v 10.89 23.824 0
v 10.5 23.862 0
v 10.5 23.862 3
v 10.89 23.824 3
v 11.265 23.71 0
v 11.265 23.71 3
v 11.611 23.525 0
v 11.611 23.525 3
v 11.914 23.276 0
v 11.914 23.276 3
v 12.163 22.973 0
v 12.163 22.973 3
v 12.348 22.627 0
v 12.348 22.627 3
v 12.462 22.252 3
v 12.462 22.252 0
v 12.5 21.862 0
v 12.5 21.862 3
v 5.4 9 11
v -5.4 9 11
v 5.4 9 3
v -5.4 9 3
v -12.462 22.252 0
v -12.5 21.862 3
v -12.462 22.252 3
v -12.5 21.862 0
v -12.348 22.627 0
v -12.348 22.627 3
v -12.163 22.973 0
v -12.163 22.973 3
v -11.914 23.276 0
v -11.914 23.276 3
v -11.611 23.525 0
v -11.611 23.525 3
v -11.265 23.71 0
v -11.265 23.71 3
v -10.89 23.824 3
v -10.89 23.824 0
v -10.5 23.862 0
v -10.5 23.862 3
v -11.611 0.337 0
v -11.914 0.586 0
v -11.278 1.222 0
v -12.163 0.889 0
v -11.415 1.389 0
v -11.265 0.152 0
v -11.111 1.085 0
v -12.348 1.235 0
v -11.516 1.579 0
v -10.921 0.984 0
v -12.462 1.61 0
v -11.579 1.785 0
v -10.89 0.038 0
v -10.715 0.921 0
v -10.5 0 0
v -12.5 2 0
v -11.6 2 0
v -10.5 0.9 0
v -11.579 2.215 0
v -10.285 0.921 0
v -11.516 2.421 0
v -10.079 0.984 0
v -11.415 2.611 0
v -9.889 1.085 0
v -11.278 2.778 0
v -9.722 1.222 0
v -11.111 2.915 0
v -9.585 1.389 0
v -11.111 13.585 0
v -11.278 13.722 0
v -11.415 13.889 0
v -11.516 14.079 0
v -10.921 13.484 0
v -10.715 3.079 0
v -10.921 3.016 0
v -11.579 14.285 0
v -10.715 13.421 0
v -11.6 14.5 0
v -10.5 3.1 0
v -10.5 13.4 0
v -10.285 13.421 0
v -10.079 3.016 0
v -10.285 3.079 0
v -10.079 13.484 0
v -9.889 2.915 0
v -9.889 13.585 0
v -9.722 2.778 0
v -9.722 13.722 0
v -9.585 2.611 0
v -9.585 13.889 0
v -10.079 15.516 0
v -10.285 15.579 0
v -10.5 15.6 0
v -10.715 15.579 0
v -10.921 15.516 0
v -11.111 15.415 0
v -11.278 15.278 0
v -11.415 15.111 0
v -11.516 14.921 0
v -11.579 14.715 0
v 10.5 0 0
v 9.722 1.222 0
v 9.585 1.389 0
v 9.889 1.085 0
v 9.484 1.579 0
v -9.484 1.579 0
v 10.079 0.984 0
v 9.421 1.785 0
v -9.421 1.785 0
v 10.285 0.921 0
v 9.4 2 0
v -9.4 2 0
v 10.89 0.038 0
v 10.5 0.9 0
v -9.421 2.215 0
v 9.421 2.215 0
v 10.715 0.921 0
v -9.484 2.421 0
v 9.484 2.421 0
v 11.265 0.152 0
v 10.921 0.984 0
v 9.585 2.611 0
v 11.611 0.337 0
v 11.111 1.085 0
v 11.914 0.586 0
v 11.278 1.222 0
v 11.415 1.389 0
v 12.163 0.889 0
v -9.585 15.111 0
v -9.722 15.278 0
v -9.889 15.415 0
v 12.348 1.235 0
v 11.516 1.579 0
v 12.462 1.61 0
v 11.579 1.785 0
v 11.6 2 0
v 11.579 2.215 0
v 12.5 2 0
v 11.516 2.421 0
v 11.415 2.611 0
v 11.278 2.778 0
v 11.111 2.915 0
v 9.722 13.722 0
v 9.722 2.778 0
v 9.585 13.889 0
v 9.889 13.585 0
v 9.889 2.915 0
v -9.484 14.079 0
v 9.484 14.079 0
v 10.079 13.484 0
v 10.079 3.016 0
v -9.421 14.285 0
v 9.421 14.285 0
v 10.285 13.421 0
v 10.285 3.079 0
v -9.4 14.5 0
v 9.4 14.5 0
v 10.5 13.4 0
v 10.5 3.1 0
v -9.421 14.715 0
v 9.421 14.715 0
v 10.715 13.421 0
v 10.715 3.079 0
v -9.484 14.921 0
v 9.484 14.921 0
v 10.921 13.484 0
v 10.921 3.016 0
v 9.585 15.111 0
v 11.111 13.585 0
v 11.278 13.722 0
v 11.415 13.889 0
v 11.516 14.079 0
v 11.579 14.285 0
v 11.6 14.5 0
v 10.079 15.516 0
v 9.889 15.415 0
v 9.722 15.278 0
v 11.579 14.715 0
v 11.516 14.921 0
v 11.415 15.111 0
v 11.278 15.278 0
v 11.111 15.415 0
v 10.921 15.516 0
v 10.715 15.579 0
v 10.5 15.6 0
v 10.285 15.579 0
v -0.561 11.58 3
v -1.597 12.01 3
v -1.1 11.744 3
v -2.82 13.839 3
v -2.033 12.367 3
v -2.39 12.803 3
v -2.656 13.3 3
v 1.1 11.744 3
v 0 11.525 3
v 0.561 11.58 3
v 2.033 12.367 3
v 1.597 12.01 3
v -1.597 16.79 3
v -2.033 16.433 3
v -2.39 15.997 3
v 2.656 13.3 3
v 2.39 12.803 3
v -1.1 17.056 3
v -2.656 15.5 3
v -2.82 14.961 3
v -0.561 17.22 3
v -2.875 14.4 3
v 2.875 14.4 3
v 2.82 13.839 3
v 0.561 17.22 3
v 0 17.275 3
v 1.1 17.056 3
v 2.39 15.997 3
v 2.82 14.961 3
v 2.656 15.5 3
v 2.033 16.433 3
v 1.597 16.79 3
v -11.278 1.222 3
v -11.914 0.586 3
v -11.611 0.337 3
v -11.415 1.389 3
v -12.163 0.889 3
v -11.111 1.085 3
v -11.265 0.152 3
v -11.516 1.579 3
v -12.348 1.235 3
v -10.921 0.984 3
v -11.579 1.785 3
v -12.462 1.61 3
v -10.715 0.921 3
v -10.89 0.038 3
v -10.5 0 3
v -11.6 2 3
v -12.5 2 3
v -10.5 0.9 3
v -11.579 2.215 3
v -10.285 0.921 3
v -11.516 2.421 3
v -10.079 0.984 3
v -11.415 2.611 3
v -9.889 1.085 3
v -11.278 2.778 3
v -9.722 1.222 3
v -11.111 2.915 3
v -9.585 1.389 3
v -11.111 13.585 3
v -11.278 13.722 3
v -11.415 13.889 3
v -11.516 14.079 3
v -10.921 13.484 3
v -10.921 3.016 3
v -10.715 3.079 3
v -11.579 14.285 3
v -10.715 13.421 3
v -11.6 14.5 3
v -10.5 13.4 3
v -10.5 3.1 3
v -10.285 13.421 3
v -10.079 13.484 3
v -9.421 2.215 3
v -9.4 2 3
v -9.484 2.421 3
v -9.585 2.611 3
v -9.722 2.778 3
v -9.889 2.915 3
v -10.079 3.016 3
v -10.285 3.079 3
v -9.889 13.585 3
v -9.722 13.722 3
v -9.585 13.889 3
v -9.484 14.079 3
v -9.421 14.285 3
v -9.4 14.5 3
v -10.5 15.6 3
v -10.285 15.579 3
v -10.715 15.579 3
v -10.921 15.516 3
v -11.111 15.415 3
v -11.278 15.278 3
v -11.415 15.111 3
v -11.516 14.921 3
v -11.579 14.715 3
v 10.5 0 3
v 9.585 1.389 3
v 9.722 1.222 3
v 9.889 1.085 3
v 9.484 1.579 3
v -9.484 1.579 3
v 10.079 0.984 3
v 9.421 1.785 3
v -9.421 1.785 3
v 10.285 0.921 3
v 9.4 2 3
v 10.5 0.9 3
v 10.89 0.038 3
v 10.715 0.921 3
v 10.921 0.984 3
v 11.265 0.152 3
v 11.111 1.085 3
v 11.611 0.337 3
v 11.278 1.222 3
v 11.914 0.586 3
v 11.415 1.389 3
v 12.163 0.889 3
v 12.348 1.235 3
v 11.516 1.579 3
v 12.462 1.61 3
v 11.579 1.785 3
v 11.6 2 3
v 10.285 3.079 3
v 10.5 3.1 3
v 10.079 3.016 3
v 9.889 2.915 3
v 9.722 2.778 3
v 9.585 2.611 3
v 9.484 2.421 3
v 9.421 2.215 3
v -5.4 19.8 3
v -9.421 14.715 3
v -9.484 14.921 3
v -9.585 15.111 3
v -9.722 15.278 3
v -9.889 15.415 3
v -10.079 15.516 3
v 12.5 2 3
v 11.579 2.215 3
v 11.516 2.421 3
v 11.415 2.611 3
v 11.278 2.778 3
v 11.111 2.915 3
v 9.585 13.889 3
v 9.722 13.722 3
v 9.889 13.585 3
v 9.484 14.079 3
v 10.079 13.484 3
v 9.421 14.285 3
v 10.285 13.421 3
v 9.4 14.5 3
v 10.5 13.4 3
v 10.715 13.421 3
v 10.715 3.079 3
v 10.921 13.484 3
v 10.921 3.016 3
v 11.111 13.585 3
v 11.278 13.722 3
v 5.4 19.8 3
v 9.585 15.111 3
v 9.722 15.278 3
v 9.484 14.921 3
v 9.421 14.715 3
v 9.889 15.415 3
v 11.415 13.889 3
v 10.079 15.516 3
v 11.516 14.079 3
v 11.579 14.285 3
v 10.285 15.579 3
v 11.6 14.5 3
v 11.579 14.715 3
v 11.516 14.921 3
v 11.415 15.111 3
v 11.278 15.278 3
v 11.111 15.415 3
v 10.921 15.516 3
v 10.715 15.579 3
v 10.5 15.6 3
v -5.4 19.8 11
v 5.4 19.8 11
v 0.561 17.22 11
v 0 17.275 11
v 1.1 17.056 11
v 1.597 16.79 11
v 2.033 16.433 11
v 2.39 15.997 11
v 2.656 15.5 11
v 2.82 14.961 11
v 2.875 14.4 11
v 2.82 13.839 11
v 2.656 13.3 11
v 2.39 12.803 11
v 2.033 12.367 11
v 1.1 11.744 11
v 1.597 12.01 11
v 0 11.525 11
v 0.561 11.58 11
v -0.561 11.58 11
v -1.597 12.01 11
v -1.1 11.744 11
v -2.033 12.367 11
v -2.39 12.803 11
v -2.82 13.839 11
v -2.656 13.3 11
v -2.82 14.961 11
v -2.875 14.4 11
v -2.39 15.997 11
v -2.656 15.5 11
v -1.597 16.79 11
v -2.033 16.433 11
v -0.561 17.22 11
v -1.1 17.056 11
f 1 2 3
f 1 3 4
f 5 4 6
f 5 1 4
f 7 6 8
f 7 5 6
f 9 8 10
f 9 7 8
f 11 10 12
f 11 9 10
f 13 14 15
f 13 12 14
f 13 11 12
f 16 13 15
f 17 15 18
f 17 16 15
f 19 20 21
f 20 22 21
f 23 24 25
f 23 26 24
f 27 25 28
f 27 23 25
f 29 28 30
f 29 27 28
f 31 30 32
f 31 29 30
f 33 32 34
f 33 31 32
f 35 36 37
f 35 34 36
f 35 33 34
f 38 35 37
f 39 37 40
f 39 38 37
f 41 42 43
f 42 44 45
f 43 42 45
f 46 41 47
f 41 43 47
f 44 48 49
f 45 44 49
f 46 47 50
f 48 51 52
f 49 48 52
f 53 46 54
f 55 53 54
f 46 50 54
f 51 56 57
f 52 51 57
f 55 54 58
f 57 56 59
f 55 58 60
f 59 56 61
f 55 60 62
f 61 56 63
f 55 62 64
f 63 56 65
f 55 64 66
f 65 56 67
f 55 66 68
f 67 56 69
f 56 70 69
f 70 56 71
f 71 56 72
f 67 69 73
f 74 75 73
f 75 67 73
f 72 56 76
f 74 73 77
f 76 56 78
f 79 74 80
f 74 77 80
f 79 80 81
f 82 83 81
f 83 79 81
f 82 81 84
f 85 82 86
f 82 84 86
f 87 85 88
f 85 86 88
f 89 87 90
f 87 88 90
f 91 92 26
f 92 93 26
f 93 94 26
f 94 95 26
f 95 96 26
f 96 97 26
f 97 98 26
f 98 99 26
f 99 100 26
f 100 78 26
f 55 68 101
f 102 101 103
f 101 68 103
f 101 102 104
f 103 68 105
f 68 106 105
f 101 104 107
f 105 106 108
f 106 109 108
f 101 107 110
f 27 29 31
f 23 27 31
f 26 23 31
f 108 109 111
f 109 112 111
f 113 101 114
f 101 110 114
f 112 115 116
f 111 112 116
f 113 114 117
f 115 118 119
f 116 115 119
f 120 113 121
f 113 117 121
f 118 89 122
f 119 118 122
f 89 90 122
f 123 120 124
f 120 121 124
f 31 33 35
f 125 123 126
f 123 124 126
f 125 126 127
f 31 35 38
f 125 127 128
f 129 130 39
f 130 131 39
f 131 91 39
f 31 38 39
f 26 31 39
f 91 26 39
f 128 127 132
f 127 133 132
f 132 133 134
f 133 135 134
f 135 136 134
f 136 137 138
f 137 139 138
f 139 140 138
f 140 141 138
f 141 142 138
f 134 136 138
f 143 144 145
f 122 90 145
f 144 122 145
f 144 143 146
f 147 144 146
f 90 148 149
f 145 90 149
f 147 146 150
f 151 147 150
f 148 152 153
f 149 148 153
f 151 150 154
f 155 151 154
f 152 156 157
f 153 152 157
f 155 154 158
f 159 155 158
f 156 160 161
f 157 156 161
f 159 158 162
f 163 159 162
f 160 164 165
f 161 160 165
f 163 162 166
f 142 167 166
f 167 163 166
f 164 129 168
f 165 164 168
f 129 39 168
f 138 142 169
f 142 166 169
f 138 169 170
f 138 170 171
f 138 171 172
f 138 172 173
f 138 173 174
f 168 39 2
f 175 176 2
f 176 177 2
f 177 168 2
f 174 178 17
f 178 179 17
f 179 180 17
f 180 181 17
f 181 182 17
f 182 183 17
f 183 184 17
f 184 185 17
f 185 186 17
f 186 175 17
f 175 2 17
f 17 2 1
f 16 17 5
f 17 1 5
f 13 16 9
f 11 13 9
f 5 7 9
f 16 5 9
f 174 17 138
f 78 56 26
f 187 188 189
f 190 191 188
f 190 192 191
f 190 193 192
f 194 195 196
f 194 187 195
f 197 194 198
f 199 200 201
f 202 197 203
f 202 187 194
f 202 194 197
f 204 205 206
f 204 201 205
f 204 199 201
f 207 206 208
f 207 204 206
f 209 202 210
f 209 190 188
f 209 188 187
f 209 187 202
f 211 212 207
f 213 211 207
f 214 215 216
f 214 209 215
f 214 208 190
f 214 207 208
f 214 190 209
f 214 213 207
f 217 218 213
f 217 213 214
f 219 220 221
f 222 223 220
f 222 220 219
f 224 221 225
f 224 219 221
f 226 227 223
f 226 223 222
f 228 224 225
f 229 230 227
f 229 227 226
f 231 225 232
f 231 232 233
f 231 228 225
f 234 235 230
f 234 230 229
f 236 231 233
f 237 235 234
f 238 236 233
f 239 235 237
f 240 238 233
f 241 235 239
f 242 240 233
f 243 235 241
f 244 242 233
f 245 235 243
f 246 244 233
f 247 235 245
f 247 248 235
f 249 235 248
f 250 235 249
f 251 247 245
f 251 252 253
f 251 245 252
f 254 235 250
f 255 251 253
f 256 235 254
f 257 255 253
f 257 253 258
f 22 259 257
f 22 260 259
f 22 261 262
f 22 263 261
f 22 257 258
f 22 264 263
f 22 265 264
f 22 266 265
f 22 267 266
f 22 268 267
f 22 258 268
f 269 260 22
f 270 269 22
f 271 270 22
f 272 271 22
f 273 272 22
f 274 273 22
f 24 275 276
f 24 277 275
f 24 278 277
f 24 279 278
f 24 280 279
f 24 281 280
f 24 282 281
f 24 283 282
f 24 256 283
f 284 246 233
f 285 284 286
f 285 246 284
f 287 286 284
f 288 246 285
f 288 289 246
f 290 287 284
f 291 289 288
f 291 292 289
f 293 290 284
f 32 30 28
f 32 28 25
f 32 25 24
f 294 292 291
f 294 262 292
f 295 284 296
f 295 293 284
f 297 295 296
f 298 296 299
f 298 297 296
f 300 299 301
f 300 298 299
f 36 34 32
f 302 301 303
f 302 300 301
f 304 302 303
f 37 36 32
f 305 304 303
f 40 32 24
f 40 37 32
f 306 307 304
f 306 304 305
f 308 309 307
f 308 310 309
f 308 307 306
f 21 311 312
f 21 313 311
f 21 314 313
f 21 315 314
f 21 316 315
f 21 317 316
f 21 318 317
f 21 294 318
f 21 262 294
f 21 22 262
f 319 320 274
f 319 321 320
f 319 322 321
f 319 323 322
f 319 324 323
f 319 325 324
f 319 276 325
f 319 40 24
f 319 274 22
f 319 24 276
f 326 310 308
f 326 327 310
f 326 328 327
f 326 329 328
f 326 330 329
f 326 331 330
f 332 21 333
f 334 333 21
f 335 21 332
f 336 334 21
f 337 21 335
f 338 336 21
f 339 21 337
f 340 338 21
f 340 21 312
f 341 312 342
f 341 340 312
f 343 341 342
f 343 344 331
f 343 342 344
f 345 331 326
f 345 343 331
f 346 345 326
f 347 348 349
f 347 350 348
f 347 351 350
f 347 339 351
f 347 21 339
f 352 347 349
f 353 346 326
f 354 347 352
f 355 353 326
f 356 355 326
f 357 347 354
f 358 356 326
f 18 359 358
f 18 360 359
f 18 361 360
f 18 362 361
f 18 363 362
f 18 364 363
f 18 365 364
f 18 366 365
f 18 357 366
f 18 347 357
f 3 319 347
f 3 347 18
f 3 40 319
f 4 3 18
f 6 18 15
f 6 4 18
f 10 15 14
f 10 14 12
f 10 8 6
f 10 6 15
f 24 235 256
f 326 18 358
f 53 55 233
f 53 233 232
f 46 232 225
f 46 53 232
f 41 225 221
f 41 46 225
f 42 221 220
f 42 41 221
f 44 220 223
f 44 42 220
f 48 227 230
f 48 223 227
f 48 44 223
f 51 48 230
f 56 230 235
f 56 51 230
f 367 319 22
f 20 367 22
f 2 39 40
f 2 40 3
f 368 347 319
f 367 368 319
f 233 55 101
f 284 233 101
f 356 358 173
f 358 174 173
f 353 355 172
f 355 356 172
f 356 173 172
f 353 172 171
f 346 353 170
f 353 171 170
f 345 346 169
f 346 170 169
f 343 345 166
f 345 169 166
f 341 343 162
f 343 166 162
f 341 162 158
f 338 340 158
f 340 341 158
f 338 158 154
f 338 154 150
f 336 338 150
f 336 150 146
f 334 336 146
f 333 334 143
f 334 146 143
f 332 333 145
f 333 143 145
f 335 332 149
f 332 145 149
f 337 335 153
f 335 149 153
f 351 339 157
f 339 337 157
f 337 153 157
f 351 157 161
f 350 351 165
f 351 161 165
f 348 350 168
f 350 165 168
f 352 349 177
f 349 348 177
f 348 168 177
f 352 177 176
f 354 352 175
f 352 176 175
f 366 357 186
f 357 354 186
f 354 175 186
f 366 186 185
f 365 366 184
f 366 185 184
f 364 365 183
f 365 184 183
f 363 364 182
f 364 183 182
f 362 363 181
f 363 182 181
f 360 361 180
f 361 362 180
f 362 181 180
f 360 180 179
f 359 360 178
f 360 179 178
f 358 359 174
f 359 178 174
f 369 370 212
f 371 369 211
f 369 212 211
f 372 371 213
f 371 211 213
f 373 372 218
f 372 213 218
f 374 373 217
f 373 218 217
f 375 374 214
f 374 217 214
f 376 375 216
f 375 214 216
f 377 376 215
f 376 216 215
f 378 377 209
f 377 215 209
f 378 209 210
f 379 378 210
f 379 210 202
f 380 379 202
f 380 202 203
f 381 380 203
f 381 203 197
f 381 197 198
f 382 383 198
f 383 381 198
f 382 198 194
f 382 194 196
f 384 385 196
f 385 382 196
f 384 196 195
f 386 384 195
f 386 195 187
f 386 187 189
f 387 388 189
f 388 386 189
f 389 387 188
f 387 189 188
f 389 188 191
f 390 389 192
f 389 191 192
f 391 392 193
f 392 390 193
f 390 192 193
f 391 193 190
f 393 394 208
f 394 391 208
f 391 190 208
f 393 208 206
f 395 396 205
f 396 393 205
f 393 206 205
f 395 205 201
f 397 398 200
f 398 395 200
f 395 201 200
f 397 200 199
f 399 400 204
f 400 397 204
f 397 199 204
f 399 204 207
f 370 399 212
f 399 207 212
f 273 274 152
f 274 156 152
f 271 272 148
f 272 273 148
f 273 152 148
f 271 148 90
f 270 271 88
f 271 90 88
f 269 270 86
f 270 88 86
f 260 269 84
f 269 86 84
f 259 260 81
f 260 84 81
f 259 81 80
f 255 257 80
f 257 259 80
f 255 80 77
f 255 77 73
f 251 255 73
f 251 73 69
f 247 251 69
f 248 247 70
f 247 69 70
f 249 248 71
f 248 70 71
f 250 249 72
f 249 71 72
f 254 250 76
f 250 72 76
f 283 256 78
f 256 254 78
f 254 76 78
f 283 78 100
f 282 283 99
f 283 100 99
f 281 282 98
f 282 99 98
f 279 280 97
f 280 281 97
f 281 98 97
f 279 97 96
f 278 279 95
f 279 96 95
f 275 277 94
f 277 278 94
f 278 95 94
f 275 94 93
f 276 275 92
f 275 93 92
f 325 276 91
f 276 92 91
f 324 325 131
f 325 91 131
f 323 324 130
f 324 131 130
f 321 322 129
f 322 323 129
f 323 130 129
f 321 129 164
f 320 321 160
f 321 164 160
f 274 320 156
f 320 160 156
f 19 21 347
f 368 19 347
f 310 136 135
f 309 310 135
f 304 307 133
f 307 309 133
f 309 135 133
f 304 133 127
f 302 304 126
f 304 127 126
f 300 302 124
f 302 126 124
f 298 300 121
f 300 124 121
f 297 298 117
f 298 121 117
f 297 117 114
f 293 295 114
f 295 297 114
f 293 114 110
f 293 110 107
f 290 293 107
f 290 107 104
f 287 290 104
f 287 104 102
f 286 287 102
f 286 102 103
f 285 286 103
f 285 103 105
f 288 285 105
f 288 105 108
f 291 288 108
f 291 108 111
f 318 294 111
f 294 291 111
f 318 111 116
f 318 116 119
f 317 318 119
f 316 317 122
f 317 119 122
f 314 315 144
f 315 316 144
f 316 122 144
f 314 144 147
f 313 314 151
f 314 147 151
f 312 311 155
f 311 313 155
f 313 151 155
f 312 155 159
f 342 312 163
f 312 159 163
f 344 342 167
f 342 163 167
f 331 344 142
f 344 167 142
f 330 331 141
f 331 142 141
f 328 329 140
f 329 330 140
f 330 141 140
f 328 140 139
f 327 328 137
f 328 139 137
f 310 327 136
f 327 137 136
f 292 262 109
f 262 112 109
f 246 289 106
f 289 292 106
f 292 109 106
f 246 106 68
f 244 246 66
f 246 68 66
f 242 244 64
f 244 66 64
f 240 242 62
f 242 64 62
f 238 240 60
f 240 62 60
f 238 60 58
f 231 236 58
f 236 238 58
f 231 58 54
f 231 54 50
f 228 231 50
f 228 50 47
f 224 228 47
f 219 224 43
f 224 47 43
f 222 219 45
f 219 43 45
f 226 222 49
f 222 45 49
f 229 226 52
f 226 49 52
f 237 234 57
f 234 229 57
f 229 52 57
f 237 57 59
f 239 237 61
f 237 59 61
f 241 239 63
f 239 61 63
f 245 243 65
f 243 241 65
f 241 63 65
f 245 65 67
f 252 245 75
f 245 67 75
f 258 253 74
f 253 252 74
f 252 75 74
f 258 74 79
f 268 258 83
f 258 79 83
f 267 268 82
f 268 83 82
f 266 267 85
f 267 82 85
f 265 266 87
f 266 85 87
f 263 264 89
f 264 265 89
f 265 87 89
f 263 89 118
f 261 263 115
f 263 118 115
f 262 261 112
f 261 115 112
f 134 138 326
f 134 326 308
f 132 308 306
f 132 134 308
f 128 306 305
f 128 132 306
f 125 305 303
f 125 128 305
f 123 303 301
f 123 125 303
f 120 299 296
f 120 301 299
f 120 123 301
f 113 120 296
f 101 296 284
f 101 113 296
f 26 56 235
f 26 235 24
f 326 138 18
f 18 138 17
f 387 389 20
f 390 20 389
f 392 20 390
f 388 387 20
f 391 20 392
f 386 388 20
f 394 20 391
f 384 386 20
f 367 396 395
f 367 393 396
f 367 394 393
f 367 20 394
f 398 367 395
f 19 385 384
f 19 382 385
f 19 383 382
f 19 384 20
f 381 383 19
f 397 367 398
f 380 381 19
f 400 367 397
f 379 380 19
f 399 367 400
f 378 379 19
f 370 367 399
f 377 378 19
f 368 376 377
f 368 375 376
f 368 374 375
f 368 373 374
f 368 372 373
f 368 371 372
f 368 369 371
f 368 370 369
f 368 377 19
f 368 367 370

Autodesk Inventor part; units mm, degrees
ref_plane "YZ Plane" through (0, 0, 0) normal (1, 0, 0) x (0, 1, 0)
ref_plane "XZ Plane" through (0, 0, 0) normal (0, 1, 0) x (-1, 0, 0)
ref_plane "XY Plane" through (0, 0, 0) normal (0, 0, 1) x (1, 0, 0)
sketch "Náčrt1" plane through (0, 0, 0) normal (0, 0, 1) x (1, 0, 0)
  line L0 (12.5, 2) -> (12.5, 21.862)
  line L1 (10.5, 23.862) -> (0, 23.862)
  circle A0 centre (10.5, 2) radius 1.1
  arc A1 (12.5, 3.2809) -> (9.2191, 0) centre (10.5, 2) ccw
  circle A2 centre (10.5, 14.5) radius 1.1
  arc A3 (12.5, 15.7809) -> (12.5, 13.2191) centre (10.5, 14.5) ccw
  line L2 (0, 0) -> (10.5, 0)
  arc A4 (10.5, 0) -> (12.5, 2) centre (10.5, 2) ccw
  arc A5 (12.5, 21.862) -> (10.5, 23.862) centre (10.5, 21.862) ccw
  line L3 (-12.5, 2) -> (-12.5, 21.862)
  line L4 (-10.5, 23.862) -> (0, 23.862)
  circle A6 centre (-10.5, 2) radius 1.1
  arc A7 (-9.2191, 0) -> (-12.5, 3.2809) centre (-10.5, 2) ccw
  circle A8 centre (-10.5, 14.5) radius 1.1
  arc A9 (-12.5, 13.2191) -> (-12.5, 15.7809) centre (-10.5, 14.5) ccw
  line L5 (0, 0) -> (-10.5, 0)
  arc A10 (-12.5, 2) -> (-10.5, 0) centre (-10.5, 2) ccw
  arc A11 (-10.5, 23.862) -> (-12.5, 21.862) centre (-10.5, 21.862) ccw
  dimension "d2" = 2.2
  dimension "d3" = 2
  dimension "d6" = 2.2
  dimension "d8" = 4.75
  dimension "d9" = 2
  dimension "d10" = 23.862
  dimension "d11" = 2
extrude "Vysunutí1" add sketch "Náčrt1" along normal blind 3
sketch "Náčrt2" plane through (0, 0, 3) normal (0, 0, 1) x (1, 0, 0)
  line L0 (0, 0) -> (0, 23.862)
  line L1 (10.5, 23.862) -> (-10.5, 23.862) projected
  arc A0 (0, 11.525) -> (0, 17.275) centre (0, 14.4) ccw
  line L2 (-10.5, 0) -> (10.5, 0) projected
  line L3 (-5.4, 9) -> (5.4, 9)
  line L4 (5.4, 9) -> (5.4, 19.8)
  line L5 (5.4, 19.8) -> (-5.4, 19.8)
  line L6 (-5.4, 19.8) -> (-5.4, 9)
  line L7 (-5.4, 9) -> (5.4, 19.8) construction
  line L8 (5.4, 9) -> (-5.4, 19.8) construction
  arc A1 (0, 17.275) -> (0, 11.525) centre (0, 14.4) ccw
  dimension "d14" = 2.875
  dimension "d15" = 14.4
  dimension "d16" = 10.8
  dimension "d17" = 10.8
extrude "Vysunutí2" add sketch "Náčrt2" along normal blind 8 contours A0 L0 L5 L4 L3 | L0 L3 L6 L5 A1
properties part number "kamera"
